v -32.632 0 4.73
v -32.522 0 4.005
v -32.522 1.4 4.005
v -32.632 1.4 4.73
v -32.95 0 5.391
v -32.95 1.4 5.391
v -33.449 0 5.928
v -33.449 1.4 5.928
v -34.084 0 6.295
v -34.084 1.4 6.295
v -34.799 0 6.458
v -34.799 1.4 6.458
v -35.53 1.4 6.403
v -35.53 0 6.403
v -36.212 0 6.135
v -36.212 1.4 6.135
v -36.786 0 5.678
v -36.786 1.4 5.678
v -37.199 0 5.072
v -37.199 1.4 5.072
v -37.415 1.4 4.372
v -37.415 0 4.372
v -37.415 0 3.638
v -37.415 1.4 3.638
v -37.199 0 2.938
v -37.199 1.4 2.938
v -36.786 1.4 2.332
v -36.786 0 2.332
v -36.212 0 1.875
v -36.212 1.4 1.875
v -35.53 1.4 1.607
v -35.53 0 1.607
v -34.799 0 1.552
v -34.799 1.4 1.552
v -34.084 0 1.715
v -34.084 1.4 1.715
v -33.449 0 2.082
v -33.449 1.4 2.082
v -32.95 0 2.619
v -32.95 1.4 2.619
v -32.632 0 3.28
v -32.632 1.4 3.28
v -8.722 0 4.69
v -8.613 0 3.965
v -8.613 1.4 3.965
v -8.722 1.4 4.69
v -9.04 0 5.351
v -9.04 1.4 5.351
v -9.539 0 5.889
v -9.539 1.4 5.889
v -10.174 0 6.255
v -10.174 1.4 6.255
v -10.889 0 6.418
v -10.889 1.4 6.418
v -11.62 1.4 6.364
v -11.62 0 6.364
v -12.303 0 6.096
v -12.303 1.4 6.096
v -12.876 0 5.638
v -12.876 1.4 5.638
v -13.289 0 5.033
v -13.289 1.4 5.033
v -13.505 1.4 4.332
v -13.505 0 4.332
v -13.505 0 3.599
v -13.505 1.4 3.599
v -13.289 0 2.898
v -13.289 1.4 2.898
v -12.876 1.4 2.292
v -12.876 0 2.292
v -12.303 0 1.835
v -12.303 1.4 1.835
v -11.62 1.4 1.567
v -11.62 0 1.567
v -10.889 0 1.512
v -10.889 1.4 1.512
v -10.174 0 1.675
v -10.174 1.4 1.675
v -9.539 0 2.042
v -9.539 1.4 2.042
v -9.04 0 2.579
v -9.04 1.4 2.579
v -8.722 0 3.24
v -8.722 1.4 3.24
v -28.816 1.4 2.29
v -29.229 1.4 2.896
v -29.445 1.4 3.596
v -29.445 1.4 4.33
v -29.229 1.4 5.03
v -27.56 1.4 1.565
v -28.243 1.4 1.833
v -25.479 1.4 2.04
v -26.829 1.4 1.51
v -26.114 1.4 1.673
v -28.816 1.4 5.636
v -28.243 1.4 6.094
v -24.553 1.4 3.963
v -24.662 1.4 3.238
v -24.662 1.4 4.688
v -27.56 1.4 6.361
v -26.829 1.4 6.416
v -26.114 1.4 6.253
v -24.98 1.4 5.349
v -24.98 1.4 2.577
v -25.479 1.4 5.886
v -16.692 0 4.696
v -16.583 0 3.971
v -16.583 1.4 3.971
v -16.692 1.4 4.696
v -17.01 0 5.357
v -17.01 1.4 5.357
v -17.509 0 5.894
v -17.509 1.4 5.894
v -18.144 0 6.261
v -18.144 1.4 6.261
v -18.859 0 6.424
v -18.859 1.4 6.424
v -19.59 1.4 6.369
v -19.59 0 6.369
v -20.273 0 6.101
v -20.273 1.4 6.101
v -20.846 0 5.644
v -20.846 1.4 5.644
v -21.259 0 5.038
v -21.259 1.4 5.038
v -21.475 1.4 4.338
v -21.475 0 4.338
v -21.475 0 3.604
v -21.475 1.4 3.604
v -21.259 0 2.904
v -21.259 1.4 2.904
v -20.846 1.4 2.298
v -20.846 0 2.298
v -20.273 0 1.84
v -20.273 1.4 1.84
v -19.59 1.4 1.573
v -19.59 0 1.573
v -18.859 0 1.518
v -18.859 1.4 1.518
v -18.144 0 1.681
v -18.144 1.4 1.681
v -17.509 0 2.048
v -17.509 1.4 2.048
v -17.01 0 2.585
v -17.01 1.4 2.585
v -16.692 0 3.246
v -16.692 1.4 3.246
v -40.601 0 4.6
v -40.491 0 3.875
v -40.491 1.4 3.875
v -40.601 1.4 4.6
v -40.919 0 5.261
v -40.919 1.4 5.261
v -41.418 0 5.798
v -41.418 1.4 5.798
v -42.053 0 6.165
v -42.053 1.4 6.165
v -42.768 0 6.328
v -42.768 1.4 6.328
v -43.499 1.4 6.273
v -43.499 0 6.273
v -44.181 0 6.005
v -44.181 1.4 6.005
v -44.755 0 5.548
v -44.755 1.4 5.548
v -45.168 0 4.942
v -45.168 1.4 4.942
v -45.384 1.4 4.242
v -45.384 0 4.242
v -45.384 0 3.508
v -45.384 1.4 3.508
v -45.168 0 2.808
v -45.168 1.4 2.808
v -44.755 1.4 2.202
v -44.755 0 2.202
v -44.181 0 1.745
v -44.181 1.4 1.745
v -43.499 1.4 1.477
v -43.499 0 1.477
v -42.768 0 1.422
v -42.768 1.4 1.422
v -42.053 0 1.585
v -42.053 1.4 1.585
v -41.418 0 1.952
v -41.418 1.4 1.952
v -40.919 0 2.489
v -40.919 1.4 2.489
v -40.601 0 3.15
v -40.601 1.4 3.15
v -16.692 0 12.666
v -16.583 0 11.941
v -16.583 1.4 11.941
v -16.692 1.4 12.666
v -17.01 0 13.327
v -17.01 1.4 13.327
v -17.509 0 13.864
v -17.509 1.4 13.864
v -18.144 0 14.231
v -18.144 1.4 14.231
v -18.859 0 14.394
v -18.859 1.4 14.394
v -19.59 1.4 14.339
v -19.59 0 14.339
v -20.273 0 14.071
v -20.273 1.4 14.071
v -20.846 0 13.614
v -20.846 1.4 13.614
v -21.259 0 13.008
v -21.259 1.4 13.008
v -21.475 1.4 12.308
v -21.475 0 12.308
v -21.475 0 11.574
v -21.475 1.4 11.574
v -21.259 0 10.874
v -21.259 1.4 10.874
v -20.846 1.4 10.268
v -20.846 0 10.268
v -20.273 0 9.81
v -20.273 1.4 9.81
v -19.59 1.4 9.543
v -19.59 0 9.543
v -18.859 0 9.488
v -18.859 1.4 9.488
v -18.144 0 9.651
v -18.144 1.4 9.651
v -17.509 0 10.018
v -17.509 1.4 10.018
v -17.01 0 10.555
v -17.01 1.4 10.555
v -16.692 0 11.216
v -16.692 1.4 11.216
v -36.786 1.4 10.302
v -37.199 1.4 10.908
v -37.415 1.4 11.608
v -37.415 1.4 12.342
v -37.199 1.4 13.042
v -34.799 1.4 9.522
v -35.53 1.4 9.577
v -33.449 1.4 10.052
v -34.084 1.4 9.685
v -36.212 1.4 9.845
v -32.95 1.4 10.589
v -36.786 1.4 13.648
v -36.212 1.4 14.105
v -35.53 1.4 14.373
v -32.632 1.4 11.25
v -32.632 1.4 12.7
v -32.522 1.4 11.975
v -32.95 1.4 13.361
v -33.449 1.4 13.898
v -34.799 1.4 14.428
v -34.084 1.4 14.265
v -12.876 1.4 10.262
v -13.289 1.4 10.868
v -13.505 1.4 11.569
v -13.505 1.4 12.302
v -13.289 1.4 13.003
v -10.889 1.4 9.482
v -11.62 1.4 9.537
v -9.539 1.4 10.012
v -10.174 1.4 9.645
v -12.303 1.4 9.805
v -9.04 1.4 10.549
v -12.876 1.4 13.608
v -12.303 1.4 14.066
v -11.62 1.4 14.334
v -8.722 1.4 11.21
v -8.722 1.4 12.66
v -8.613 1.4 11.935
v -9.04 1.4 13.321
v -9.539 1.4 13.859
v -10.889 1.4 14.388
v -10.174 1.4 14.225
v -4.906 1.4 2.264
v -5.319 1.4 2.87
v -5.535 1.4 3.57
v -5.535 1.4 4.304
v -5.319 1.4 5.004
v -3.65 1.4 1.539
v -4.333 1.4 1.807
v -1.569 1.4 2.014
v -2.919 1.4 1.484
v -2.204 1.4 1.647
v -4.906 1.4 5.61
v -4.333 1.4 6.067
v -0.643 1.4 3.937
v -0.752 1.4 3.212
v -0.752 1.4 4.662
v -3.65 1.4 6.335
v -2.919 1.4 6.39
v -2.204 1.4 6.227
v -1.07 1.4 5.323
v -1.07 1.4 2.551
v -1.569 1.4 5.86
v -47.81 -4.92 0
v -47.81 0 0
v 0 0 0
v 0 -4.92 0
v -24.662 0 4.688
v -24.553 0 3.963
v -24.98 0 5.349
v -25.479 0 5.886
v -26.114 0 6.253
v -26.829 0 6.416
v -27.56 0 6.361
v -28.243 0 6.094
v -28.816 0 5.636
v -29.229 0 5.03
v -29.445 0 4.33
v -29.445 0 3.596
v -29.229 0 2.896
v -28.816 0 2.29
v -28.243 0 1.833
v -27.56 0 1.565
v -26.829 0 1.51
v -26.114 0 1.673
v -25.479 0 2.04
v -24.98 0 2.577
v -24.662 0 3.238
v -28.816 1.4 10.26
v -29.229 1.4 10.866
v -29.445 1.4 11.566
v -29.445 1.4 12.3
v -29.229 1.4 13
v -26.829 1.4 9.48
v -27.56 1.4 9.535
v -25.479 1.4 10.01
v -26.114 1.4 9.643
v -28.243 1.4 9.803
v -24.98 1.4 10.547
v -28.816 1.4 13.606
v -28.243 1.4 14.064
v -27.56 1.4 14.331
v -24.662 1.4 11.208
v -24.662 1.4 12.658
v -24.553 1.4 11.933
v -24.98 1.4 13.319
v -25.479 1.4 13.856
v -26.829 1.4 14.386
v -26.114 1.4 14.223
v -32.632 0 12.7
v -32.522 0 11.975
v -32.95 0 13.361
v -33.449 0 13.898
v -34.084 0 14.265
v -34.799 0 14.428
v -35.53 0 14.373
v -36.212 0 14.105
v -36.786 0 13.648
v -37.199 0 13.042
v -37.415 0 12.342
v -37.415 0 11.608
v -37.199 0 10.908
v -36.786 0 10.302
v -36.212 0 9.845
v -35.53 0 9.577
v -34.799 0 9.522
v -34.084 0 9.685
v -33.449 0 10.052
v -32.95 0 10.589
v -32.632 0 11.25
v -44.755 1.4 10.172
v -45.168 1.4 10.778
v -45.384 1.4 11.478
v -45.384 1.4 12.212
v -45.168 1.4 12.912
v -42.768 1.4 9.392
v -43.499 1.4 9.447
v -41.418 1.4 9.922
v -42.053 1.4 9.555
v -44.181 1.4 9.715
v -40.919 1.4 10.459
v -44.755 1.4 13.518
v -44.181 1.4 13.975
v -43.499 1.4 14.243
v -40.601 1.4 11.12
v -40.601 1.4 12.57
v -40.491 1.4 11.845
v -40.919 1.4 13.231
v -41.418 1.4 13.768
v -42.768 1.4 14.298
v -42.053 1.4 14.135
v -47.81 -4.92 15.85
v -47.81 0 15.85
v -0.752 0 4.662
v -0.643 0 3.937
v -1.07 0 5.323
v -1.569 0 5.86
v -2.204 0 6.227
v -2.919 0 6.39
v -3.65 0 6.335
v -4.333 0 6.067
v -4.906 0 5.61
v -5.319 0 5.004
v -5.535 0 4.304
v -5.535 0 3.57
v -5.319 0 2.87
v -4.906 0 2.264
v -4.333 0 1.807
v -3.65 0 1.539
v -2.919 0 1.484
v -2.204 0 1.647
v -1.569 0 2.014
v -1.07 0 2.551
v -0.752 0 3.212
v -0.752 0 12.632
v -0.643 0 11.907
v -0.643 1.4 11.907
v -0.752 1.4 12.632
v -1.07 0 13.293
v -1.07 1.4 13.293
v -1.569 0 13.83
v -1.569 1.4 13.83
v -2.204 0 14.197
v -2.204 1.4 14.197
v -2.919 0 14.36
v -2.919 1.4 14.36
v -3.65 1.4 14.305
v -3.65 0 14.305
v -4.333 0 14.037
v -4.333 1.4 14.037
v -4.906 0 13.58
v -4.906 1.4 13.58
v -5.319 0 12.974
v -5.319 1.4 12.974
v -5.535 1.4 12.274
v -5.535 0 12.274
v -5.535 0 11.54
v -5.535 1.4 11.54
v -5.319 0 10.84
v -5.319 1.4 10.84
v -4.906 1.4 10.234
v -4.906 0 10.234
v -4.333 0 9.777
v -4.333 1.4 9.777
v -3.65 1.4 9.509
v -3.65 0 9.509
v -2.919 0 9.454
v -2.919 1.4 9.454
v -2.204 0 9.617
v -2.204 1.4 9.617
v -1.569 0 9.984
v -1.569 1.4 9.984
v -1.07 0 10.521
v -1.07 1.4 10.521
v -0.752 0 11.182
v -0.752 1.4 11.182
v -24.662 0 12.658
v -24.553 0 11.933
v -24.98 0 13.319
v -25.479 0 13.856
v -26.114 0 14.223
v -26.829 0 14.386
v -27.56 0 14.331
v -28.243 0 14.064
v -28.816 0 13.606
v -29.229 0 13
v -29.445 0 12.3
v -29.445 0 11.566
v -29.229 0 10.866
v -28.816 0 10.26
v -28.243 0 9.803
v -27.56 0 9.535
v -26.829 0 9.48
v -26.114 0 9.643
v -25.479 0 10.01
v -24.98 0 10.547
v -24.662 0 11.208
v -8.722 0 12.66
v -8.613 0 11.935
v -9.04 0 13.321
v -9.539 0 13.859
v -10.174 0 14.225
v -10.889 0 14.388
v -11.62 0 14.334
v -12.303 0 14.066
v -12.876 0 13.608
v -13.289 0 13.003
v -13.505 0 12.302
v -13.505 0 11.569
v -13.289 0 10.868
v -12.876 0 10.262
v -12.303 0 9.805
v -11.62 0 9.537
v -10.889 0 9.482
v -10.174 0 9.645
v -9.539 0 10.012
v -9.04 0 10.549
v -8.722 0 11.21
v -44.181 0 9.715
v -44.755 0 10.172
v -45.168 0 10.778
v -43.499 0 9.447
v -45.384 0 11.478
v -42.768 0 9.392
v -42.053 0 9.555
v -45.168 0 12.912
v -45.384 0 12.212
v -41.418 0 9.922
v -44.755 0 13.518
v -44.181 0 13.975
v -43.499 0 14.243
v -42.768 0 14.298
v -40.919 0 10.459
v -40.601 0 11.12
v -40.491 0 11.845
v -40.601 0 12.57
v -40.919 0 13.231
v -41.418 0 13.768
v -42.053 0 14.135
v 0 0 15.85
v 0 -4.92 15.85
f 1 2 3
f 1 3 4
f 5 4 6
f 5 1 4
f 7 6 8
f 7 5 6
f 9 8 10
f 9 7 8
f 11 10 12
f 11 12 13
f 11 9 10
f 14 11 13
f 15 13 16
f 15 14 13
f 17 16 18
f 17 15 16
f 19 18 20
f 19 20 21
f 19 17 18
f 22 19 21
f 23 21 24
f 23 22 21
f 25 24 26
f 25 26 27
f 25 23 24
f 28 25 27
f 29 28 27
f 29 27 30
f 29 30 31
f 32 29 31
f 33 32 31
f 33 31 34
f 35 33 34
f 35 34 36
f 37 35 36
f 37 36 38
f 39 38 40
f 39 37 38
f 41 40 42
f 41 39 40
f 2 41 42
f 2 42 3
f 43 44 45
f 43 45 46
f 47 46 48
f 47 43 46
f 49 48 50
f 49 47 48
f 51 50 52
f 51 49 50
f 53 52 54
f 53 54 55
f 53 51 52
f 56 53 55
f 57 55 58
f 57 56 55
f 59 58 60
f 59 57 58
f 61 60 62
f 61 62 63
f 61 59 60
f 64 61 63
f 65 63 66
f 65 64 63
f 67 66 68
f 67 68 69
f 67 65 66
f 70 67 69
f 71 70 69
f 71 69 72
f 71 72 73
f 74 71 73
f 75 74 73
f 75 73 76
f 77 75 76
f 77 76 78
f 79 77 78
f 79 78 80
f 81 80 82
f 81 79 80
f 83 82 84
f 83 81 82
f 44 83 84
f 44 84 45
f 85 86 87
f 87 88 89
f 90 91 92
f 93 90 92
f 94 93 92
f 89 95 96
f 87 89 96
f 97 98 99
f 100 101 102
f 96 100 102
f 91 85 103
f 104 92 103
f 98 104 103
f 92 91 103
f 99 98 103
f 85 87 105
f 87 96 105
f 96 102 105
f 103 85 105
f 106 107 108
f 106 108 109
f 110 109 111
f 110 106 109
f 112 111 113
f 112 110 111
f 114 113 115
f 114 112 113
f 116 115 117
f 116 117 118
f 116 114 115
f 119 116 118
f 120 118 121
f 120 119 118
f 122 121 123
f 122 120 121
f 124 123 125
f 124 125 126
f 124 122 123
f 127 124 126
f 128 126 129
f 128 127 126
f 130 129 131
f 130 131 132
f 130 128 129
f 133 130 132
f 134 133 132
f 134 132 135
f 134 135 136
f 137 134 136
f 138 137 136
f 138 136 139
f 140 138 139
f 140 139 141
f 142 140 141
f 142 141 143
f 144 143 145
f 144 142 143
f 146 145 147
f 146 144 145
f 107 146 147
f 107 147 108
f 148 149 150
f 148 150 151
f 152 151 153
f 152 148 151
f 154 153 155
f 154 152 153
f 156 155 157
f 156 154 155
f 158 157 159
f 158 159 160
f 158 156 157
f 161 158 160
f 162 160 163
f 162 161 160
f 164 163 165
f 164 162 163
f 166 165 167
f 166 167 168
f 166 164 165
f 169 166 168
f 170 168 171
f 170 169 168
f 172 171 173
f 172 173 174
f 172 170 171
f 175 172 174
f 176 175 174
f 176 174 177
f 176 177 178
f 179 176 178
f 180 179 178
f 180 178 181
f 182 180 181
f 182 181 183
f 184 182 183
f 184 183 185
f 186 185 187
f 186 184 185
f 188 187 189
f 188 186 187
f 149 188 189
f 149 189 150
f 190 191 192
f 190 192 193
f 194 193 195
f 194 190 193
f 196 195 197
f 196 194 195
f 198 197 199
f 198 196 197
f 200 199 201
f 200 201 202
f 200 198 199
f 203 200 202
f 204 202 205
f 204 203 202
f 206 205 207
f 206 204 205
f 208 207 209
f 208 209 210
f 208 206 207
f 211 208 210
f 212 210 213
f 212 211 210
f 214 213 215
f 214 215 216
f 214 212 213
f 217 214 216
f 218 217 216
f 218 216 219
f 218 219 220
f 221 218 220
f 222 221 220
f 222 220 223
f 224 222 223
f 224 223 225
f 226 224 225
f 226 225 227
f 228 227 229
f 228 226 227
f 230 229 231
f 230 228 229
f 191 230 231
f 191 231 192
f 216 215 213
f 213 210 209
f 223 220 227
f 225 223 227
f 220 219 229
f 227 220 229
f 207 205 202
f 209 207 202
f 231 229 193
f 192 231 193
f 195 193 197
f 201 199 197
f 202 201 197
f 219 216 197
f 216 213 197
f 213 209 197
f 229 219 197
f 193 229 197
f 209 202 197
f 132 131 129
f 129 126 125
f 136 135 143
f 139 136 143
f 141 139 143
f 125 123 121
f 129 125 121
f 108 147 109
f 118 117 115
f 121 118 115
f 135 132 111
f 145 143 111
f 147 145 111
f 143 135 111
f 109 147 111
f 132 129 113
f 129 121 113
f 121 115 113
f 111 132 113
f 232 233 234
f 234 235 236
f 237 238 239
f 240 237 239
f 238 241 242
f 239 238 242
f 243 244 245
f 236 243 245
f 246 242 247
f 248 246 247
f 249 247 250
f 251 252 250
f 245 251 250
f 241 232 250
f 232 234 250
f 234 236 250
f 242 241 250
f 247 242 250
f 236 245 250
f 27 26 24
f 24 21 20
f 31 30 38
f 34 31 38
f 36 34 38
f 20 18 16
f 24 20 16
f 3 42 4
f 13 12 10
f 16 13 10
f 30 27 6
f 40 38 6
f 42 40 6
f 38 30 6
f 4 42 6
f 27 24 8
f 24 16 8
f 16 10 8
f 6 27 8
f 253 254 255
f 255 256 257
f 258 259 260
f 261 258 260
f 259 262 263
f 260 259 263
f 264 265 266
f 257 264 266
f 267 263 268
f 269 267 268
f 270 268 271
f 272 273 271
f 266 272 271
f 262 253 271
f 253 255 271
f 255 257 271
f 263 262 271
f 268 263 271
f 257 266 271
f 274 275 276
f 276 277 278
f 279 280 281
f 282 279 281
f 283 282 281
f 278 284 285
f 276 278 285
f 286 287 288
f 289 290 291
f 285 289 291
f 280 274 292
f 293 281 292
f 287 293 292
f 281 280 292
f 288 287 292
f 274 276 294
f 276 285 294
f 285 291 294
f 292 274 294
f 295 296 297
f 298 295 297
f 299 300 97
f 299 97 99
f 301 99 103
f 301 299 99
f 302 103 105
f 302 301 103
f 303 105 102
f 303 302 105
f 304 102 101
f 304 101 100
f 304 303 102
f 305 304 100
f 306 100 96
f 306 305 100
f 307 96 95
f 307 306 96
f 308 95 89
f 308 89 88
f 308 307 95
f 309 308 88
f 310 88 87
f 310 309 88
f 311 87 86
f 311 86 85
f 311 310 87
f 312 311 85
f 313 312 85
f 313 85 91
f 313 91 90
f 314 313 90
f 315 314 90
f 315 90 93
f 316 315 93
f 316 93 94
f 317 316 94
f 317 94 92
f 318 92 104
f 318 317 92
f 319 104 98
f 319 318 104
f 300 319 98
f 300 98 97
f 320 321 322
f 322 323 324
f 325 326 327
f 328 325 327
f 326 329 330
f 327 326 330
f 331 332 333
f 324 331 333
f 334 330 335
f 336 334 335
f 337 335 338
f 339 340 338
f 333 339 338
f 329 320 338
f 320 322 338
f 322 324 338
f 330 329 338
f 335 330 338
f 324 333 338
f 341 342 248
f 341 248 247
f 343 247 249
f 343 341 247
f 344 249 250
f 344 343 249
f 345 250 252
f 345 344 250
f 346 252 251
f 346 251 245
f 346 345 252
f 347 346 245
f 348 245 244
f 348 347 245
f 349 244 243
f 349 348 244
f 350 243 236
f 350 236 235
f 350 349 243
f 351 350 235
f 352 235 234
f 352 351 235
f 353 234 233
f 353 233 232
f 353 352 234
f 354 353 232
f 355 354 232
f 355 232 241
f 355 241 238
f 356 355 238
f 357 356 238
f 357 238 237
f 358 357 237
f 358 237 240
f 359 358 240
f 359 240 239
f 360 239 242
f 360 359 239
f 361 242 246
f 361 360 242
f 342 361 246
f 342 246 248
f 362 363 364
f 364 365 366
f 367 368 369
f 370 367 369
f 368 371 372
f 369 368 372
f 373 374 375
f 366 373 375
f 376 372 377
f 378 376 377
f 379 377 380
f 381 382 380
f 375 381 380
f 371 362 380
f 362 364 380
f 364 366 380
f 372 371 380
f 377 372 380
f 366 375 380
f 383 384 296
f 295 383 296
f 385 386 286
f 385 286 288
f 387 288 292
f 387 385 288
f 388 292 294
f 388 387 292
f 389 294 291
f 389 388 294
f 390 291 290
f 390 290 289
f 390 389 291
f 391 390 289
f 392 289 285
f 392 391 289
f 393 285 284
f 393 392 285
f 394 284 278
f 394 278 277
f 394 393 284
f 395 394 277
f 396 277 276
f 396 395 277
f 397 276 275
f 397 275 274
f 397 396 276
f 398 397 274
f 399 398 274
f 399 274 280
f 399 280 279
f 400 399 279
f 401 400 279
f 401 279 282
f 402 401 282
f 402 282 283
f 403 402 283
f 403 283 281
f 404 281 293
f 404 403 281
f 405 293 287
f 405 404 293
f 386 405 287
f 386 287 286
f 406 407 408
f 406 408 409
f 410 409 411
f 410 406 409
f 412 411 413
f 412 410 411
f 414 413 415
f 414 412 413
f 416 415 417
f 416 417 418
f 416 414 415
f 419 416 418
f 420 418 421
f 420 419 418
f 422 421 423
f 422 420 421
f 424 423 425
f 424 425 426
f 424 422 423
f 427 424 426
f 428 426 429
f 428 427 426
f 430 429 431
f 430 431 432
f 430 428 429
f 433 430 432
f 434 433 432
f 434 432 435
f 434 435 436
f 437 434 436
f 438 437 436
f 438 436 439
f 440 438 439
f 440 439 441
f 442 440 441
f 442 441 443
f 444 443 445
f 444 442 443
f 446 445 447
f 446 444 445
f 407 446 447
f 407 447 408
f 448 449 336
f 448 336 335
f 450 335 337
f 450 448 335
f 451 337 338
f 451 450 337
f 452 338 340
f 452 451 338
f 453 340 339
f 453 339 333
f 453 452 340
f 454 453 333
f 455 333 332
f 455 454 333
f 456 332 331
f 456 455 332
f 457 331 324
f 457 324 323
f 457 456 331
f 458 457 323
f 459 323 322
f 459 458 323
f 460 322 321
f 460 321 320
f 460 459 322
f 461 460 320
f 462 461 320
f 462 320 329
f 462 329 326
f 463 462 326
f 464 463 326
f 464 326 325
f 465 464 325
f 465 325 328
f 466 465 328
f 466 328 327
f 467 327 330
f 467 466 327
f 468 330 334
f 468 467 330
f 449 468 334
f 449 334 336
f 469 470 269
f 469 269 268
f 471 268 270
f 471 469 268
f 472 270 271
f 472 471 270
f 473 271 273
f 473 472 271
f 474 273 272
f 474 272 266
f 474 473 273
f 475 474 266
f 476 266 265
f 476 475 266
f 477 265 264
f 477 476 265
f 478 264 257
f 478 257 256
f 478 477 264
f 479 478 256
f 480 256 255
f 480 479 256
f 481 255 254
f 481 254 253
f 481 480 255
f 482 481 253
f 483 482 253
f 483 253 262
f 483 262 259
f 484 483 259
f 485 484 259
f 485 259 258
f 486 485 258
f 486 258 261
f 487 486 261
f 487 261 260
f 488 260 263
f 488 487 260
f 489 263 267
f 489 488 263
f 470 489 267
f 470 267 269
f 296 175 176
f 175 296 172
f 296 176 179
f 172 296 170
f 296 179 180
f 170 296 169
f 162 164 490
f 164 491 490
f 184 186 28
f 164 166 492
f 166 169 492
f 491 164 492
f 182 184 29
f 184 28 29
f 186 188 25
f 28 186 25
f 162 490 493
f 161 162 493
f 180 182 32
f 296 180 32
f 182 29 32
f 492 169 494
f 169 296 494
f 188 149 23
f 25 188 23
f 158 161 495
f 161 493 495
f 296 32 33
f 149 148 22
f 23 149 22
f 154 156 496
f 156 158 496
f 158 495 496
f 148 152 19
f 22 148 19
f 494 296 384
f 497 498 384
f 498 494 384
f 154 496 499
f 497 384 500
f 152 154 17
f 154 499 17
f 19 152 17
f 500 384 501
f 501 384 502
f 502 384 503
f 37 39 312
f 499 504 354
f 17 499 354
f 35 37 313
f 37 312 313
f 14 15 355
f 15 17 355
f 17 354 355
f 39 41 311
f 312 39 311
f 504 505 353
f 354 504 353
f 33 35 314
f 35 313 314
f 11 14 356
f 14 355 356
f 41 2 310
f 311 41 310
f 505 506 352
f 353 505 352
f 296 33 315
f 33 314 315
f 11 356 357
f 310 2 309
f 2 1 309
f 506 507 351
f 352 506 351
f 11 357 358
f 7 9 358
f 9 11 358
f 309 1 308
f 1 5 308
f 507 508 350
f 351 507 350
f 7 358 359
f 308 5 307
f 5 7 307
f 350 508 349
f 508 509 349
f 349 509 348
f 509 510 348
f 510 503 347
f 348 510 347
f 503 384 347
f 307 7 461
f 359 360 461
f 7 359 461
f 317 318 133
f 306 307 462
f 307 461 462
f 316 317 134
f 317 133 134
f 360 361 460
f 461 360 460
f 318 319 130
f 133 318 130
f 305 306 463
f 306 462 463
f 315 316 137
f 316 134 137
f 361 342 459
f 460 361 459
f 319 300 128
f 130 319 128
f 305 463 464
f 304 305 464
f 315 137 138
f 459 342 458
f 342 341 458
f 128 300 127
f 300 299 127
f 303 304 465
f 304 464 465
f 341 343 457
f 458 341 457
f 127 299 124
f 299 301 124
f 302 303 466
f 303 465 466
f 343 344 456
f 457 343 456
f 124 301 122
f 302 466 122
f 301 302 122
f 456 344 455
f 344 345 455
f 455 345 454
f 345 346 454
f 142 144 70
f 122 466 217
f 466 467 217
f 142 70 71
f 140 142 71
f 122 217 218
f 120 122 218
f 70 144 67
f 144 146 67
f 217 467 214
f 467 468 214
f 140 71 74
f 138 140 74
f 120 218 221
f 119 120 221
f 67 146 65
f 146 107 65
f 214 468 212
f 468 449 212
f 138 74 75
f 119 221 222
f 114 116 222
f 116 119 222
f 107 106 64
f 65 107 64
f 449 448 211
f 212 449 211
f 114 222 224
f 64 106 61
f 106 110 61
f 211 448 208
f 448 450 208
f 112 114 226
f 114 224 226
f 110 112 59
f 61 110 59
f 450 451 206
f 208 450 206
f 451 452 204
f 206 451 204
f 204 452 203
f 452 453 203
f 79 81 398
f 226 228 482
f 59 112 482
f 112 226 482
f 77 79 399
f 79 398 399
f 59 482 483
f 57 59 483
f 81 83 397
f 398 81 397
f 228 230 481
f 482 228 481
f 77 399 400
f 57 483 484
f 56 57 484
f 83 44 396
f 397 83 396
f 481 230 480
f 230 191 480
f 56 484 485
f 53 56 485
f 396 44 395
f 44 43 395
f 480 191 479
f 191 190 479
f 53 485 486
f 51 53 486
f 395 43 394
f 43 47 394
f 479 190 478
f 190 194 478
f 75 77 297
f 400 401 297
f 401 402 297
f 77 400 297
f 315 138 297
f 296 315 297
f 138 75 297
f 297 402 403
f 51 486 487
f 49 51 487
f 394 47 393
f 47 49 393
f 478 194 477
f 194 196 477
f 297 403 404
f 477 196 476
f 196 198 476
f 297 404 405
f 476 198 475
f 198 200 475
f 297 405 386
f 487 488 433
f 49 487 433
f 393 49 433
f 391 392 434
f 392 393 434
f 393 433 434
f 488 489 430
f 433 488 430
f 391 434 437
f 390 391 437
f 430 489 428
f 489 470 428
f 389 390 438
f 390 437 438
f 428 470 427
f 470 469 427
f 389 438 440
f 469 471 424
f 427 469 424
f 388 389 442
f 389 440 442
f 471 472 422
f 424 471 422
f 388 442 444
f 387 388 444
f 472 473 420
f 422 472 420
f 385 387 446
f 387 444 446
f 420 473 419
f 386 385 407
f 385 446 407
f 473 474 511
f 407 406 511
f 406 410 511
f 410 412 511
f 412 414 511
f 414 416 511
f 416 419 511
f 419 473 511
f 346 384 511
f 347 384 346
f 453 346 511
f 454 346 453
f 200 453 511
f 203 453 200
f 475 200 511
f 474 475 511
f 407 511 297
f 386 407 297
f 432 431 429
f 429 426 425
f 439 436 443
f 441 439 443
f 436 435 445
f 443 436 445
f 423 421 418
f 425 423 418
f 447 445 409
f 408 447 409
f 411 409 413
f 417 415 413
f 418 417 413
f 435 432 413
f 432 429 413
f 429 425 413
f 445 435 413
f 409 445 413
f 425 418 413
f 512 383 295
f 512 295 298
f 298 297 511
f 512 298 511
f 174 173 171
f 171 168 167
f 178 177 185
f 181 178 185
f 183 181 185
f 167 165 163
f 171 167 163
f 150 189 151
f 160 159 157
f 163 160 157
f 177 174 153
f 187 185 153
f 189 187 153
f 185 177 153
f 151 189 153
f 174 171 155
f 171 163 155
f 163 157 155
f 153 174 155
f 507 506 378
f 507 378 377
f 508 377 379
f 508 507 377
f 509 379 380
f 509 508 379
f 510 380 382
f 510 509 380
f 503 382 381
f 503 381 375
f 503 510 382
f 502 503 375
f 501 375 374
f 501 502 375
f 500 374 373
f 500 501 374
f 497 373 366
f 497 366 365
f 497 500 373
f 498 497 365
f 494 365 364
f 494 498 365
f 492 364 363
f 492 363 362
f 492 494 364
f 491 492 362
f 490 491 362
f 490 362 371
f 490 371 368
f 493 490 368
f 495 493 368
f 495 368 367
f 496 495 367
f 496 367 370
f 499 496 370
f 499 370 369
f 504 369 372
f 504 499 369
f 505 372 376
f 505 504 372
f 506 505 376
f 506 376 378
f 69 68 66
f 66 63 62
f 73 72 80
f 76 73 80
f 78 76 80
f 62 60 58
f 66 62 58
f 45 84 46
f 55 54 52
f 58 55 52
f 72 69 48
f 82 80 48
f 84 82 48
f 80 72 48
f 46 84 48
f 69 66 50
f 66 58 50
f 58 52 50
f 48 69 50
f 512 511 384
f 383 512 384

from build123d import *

# Parameters (mm, degrees)
F0_R     = 2.46
F1_DEPTH = 4.92
F2_R     = 2.46
F4_DEPTH = 1.4


# Not quite as in the source:
# - the program builds the solid bodies; features that only make, move or delete a surface that nothing else refers to are left out


with BuildPart() as f1:
    # F0 (on Front) → F1 (new body)
    with BuildSketch(Plane.XZ):
        Polygon((-47.81, 0), (0, 0), (0, 15.85), (-47.81, 15.85), (-47.81, 4.5985402539), align=None)
        with BuildLine():
            ThreePointArc((-42.89, 4.5985402539), (-45.35, 2.1385402539), (-47.81, 4.5985402539))
            ThreePointArc((-47.81, 4.5985402539), (-45.3923948453, 7.0581749173), (-42.8914612381, 4.6833173524))
            ThreePointArc((-42.8914612381, 4.6833173524), (-42.8903653367, 4.6409350993), (-42.89, 4.5985402539))
        make_face(mode=Mode.SUBTRACT)
        with BuildLine():
            ThreePointArc((-37.9729224851, 4.7680947078), (-40.3905275113, 2.3084600467), (-42.8914612381, 4.6833173524))
            ThreePointArc((-42.8914612381, 4.6833173524), (-40.475317459, 7.227729369), (-37.9729224851, 4.7680947078))
        make_face(mode=Mode.SUBTRACT)
        with Locations((-26.7290156335, 5.1733576693)):
            Circle(F0_R, mode=Mode.SUBTRACT)
        with Locations((-20.1186146587, 3.1614964828)):
            Circle(F0_R, mode=Mode.SUBTRACT)
        with Locations((-13.7956207618, 3.1614964828)):
            Circle(F0_R, mode=Mode.SUBTRACT)
        with BuildLine():
            ThreePointArc((-6.4156207618, 3.1614964828), (-8.8756207618, 0.7014964828), (-11.3356207618, 3.1614964828))
            ThreePointArc((-11.3356207618, 3.1614964828), (-8.8756207618, 5.6214964828), (-6.4156207618, 3.1614964828))
        make_face(mode=Mode.SUBTRACT)
        with Locations((-43.3987230062, 10.9215332195)):
            Circle(F0_R, mode=Mode.SUBTRACT)
        with Locations((-34.7764603794, 10.9215332195)):
            Circle(F0_R, mode=Mode.SUBTRACT)
        with BuildLine():
            ThreePointArc((-24.2718000183, 10.8045228756), (-29.1883194387, 10.9800549535), (-24.2690156335, 10.9215332195))
            ThreePointArc((-24.2690156335, 10.9215332195), (-24.2697118282, 10.8630114856), (-24.2718000183, 10.8045228756))
        make_face(mode=Mode.SUBTRACT)
        with BuildLine():
            ThreePointArc((-19.3545844044, 10.6875125042), (-21.8731061521, 8.2282086993), (-24.2718000183, 10.8045228756))
            ThreePointArc((-24.2718000183, 10.8045228756), (-21.7560626567, 13.1468163092), (-19.3545844044, 10.6875125042))
        make_face(mode=Mode.SUBTRACT)
        with Locations((-13.2208028808, 10.9215332195)):
            Circle(F0_R, mode=Mode.SUBTRACT)
        with Locations((-6.3229943626, 10.9215332195)):
            Circle(F0_R, mode=Mode.SUBTRACT)
        with BuildLine():
            ThreePointArc((-42.8914612381, 4.6833173524), (-45.3923948453, 7.0581749173), (-47.81, 4.5985402539))
            ThreePointArc((-47.81, 4.5985402539), (-45.35, 2.1385402539), (-42.89, 4.5985402539))
            ThreePointArc((-42.89, 4.5985402539), (-42.8903653367, 4.6409350993), (-42.8914612381, 4.6833173524))
        make_face()
        with BuildLine():
            ThreePointArc((-37.9729224851, 4.7680947078), (-40.475317459, 7.227729369), (-42.8914612381, 4.6833173524))
            ThreePointArc((-42.8914612381, 4.6833173524), (-40.3905275113, 2.3084600467), (-37.9729224851, 4.7680947078))
        make_face()
        with Locations((-43.3987230062, 10.9215332195)):
            Circle(F0_R)
        with Locations((-26.7290156335, 5.1733576693)):
            Circle(F0_R)
        with BuildLine():
            ThreePointArc((-24.2718000183, 10.8045228756), (-24.2697118282, 10.8630114856), (-24.2690156335, 10.9215332195))
            ThreePointArc((-24.2690156335, 10.9215332195), (-29.1883194387, 10.9800549535), (-24.2718000183, 10.8045228756))
        make_face()
        with BuildLine():
            ThreePointArc((-19.3545844044, 10.6875125042), (-21.7560626567, 13.1468163092), (-24.2718000183, 10.8045228756))
            ThreePointArc((-24.2718000183, 10.8045228756), (-21.8731061521, 8.2282086993), (-19.3545844044, 10.6875125042))
        make_face()
        with Locations((-20.1186146587, 3.1614964828)):
            Circle(F0_R)
        with Locations((-13.7956207618, 3.1614964828)):
            Circle(F0_R)
        with BuildLine():
            ThreePointArc((-6.4156207618, 3.1614964828), (-8.8756207618, 5.6214964828), (-11.3356207618, 3.1614964828))
            ThreePointArc((-11.3356207618, 3.1614964828), (-8.8756207618, 0.7014964828), (-6.4156207618, 3.1614964828))
        make_face()
        with Locations((-13.2208028808, 10.9215332195)):
            Circle(F0_R)
        with Locations((-6.3229943626, 10.9215332195)):
            Circle(F0_R)
        with Locations((-34.7764603794, 10.9215332195)):
            Circle(F0_R)
    extrude(amount=F1_DEPTH)

    # F2 (on Front) → F4 (join)
    with BuildSketch(Plane.XZ):
        with Locations((-42.9514177962, 11.845)):
            Circle(F2_R)
        with Locations((-42.9514177962, 3.875)):
            Circle(F2_R)
        with Locations((-34.9824780926, 11.975)):
            Circle(F2_R)
        with Locations((-34.9824780926, 4.005)):
            Circle(F2_R)
        with Locations((-27.0125882826, 11.9330903837)):
            Circle(F2_R)
        with Locations((-19.0425920932, 11.9408840209)):
            Circle(F2_R)
        with Locations((-11.0725940906, 3.9652414555)):
            Circle(F2_R)
        with Locations((-11.0725940906, 11.9352414555)):
            Circle(F2_R)
        with Locations((-3.1026442768, 3.9369577962)):
            Circle(F2_R)
        with Locations((-3.1026442768, 11.9069577962)):
            Circle(F2_R)
        with Locations((-19.0425920932, 3.9708840209)):
            Circle(F2_R)
        with Locations((-27.0125882826, 3.9630903837)):
            Circle(F2_R)
    extrude(amount=-F4_DEPTH)


solid = f1.part
